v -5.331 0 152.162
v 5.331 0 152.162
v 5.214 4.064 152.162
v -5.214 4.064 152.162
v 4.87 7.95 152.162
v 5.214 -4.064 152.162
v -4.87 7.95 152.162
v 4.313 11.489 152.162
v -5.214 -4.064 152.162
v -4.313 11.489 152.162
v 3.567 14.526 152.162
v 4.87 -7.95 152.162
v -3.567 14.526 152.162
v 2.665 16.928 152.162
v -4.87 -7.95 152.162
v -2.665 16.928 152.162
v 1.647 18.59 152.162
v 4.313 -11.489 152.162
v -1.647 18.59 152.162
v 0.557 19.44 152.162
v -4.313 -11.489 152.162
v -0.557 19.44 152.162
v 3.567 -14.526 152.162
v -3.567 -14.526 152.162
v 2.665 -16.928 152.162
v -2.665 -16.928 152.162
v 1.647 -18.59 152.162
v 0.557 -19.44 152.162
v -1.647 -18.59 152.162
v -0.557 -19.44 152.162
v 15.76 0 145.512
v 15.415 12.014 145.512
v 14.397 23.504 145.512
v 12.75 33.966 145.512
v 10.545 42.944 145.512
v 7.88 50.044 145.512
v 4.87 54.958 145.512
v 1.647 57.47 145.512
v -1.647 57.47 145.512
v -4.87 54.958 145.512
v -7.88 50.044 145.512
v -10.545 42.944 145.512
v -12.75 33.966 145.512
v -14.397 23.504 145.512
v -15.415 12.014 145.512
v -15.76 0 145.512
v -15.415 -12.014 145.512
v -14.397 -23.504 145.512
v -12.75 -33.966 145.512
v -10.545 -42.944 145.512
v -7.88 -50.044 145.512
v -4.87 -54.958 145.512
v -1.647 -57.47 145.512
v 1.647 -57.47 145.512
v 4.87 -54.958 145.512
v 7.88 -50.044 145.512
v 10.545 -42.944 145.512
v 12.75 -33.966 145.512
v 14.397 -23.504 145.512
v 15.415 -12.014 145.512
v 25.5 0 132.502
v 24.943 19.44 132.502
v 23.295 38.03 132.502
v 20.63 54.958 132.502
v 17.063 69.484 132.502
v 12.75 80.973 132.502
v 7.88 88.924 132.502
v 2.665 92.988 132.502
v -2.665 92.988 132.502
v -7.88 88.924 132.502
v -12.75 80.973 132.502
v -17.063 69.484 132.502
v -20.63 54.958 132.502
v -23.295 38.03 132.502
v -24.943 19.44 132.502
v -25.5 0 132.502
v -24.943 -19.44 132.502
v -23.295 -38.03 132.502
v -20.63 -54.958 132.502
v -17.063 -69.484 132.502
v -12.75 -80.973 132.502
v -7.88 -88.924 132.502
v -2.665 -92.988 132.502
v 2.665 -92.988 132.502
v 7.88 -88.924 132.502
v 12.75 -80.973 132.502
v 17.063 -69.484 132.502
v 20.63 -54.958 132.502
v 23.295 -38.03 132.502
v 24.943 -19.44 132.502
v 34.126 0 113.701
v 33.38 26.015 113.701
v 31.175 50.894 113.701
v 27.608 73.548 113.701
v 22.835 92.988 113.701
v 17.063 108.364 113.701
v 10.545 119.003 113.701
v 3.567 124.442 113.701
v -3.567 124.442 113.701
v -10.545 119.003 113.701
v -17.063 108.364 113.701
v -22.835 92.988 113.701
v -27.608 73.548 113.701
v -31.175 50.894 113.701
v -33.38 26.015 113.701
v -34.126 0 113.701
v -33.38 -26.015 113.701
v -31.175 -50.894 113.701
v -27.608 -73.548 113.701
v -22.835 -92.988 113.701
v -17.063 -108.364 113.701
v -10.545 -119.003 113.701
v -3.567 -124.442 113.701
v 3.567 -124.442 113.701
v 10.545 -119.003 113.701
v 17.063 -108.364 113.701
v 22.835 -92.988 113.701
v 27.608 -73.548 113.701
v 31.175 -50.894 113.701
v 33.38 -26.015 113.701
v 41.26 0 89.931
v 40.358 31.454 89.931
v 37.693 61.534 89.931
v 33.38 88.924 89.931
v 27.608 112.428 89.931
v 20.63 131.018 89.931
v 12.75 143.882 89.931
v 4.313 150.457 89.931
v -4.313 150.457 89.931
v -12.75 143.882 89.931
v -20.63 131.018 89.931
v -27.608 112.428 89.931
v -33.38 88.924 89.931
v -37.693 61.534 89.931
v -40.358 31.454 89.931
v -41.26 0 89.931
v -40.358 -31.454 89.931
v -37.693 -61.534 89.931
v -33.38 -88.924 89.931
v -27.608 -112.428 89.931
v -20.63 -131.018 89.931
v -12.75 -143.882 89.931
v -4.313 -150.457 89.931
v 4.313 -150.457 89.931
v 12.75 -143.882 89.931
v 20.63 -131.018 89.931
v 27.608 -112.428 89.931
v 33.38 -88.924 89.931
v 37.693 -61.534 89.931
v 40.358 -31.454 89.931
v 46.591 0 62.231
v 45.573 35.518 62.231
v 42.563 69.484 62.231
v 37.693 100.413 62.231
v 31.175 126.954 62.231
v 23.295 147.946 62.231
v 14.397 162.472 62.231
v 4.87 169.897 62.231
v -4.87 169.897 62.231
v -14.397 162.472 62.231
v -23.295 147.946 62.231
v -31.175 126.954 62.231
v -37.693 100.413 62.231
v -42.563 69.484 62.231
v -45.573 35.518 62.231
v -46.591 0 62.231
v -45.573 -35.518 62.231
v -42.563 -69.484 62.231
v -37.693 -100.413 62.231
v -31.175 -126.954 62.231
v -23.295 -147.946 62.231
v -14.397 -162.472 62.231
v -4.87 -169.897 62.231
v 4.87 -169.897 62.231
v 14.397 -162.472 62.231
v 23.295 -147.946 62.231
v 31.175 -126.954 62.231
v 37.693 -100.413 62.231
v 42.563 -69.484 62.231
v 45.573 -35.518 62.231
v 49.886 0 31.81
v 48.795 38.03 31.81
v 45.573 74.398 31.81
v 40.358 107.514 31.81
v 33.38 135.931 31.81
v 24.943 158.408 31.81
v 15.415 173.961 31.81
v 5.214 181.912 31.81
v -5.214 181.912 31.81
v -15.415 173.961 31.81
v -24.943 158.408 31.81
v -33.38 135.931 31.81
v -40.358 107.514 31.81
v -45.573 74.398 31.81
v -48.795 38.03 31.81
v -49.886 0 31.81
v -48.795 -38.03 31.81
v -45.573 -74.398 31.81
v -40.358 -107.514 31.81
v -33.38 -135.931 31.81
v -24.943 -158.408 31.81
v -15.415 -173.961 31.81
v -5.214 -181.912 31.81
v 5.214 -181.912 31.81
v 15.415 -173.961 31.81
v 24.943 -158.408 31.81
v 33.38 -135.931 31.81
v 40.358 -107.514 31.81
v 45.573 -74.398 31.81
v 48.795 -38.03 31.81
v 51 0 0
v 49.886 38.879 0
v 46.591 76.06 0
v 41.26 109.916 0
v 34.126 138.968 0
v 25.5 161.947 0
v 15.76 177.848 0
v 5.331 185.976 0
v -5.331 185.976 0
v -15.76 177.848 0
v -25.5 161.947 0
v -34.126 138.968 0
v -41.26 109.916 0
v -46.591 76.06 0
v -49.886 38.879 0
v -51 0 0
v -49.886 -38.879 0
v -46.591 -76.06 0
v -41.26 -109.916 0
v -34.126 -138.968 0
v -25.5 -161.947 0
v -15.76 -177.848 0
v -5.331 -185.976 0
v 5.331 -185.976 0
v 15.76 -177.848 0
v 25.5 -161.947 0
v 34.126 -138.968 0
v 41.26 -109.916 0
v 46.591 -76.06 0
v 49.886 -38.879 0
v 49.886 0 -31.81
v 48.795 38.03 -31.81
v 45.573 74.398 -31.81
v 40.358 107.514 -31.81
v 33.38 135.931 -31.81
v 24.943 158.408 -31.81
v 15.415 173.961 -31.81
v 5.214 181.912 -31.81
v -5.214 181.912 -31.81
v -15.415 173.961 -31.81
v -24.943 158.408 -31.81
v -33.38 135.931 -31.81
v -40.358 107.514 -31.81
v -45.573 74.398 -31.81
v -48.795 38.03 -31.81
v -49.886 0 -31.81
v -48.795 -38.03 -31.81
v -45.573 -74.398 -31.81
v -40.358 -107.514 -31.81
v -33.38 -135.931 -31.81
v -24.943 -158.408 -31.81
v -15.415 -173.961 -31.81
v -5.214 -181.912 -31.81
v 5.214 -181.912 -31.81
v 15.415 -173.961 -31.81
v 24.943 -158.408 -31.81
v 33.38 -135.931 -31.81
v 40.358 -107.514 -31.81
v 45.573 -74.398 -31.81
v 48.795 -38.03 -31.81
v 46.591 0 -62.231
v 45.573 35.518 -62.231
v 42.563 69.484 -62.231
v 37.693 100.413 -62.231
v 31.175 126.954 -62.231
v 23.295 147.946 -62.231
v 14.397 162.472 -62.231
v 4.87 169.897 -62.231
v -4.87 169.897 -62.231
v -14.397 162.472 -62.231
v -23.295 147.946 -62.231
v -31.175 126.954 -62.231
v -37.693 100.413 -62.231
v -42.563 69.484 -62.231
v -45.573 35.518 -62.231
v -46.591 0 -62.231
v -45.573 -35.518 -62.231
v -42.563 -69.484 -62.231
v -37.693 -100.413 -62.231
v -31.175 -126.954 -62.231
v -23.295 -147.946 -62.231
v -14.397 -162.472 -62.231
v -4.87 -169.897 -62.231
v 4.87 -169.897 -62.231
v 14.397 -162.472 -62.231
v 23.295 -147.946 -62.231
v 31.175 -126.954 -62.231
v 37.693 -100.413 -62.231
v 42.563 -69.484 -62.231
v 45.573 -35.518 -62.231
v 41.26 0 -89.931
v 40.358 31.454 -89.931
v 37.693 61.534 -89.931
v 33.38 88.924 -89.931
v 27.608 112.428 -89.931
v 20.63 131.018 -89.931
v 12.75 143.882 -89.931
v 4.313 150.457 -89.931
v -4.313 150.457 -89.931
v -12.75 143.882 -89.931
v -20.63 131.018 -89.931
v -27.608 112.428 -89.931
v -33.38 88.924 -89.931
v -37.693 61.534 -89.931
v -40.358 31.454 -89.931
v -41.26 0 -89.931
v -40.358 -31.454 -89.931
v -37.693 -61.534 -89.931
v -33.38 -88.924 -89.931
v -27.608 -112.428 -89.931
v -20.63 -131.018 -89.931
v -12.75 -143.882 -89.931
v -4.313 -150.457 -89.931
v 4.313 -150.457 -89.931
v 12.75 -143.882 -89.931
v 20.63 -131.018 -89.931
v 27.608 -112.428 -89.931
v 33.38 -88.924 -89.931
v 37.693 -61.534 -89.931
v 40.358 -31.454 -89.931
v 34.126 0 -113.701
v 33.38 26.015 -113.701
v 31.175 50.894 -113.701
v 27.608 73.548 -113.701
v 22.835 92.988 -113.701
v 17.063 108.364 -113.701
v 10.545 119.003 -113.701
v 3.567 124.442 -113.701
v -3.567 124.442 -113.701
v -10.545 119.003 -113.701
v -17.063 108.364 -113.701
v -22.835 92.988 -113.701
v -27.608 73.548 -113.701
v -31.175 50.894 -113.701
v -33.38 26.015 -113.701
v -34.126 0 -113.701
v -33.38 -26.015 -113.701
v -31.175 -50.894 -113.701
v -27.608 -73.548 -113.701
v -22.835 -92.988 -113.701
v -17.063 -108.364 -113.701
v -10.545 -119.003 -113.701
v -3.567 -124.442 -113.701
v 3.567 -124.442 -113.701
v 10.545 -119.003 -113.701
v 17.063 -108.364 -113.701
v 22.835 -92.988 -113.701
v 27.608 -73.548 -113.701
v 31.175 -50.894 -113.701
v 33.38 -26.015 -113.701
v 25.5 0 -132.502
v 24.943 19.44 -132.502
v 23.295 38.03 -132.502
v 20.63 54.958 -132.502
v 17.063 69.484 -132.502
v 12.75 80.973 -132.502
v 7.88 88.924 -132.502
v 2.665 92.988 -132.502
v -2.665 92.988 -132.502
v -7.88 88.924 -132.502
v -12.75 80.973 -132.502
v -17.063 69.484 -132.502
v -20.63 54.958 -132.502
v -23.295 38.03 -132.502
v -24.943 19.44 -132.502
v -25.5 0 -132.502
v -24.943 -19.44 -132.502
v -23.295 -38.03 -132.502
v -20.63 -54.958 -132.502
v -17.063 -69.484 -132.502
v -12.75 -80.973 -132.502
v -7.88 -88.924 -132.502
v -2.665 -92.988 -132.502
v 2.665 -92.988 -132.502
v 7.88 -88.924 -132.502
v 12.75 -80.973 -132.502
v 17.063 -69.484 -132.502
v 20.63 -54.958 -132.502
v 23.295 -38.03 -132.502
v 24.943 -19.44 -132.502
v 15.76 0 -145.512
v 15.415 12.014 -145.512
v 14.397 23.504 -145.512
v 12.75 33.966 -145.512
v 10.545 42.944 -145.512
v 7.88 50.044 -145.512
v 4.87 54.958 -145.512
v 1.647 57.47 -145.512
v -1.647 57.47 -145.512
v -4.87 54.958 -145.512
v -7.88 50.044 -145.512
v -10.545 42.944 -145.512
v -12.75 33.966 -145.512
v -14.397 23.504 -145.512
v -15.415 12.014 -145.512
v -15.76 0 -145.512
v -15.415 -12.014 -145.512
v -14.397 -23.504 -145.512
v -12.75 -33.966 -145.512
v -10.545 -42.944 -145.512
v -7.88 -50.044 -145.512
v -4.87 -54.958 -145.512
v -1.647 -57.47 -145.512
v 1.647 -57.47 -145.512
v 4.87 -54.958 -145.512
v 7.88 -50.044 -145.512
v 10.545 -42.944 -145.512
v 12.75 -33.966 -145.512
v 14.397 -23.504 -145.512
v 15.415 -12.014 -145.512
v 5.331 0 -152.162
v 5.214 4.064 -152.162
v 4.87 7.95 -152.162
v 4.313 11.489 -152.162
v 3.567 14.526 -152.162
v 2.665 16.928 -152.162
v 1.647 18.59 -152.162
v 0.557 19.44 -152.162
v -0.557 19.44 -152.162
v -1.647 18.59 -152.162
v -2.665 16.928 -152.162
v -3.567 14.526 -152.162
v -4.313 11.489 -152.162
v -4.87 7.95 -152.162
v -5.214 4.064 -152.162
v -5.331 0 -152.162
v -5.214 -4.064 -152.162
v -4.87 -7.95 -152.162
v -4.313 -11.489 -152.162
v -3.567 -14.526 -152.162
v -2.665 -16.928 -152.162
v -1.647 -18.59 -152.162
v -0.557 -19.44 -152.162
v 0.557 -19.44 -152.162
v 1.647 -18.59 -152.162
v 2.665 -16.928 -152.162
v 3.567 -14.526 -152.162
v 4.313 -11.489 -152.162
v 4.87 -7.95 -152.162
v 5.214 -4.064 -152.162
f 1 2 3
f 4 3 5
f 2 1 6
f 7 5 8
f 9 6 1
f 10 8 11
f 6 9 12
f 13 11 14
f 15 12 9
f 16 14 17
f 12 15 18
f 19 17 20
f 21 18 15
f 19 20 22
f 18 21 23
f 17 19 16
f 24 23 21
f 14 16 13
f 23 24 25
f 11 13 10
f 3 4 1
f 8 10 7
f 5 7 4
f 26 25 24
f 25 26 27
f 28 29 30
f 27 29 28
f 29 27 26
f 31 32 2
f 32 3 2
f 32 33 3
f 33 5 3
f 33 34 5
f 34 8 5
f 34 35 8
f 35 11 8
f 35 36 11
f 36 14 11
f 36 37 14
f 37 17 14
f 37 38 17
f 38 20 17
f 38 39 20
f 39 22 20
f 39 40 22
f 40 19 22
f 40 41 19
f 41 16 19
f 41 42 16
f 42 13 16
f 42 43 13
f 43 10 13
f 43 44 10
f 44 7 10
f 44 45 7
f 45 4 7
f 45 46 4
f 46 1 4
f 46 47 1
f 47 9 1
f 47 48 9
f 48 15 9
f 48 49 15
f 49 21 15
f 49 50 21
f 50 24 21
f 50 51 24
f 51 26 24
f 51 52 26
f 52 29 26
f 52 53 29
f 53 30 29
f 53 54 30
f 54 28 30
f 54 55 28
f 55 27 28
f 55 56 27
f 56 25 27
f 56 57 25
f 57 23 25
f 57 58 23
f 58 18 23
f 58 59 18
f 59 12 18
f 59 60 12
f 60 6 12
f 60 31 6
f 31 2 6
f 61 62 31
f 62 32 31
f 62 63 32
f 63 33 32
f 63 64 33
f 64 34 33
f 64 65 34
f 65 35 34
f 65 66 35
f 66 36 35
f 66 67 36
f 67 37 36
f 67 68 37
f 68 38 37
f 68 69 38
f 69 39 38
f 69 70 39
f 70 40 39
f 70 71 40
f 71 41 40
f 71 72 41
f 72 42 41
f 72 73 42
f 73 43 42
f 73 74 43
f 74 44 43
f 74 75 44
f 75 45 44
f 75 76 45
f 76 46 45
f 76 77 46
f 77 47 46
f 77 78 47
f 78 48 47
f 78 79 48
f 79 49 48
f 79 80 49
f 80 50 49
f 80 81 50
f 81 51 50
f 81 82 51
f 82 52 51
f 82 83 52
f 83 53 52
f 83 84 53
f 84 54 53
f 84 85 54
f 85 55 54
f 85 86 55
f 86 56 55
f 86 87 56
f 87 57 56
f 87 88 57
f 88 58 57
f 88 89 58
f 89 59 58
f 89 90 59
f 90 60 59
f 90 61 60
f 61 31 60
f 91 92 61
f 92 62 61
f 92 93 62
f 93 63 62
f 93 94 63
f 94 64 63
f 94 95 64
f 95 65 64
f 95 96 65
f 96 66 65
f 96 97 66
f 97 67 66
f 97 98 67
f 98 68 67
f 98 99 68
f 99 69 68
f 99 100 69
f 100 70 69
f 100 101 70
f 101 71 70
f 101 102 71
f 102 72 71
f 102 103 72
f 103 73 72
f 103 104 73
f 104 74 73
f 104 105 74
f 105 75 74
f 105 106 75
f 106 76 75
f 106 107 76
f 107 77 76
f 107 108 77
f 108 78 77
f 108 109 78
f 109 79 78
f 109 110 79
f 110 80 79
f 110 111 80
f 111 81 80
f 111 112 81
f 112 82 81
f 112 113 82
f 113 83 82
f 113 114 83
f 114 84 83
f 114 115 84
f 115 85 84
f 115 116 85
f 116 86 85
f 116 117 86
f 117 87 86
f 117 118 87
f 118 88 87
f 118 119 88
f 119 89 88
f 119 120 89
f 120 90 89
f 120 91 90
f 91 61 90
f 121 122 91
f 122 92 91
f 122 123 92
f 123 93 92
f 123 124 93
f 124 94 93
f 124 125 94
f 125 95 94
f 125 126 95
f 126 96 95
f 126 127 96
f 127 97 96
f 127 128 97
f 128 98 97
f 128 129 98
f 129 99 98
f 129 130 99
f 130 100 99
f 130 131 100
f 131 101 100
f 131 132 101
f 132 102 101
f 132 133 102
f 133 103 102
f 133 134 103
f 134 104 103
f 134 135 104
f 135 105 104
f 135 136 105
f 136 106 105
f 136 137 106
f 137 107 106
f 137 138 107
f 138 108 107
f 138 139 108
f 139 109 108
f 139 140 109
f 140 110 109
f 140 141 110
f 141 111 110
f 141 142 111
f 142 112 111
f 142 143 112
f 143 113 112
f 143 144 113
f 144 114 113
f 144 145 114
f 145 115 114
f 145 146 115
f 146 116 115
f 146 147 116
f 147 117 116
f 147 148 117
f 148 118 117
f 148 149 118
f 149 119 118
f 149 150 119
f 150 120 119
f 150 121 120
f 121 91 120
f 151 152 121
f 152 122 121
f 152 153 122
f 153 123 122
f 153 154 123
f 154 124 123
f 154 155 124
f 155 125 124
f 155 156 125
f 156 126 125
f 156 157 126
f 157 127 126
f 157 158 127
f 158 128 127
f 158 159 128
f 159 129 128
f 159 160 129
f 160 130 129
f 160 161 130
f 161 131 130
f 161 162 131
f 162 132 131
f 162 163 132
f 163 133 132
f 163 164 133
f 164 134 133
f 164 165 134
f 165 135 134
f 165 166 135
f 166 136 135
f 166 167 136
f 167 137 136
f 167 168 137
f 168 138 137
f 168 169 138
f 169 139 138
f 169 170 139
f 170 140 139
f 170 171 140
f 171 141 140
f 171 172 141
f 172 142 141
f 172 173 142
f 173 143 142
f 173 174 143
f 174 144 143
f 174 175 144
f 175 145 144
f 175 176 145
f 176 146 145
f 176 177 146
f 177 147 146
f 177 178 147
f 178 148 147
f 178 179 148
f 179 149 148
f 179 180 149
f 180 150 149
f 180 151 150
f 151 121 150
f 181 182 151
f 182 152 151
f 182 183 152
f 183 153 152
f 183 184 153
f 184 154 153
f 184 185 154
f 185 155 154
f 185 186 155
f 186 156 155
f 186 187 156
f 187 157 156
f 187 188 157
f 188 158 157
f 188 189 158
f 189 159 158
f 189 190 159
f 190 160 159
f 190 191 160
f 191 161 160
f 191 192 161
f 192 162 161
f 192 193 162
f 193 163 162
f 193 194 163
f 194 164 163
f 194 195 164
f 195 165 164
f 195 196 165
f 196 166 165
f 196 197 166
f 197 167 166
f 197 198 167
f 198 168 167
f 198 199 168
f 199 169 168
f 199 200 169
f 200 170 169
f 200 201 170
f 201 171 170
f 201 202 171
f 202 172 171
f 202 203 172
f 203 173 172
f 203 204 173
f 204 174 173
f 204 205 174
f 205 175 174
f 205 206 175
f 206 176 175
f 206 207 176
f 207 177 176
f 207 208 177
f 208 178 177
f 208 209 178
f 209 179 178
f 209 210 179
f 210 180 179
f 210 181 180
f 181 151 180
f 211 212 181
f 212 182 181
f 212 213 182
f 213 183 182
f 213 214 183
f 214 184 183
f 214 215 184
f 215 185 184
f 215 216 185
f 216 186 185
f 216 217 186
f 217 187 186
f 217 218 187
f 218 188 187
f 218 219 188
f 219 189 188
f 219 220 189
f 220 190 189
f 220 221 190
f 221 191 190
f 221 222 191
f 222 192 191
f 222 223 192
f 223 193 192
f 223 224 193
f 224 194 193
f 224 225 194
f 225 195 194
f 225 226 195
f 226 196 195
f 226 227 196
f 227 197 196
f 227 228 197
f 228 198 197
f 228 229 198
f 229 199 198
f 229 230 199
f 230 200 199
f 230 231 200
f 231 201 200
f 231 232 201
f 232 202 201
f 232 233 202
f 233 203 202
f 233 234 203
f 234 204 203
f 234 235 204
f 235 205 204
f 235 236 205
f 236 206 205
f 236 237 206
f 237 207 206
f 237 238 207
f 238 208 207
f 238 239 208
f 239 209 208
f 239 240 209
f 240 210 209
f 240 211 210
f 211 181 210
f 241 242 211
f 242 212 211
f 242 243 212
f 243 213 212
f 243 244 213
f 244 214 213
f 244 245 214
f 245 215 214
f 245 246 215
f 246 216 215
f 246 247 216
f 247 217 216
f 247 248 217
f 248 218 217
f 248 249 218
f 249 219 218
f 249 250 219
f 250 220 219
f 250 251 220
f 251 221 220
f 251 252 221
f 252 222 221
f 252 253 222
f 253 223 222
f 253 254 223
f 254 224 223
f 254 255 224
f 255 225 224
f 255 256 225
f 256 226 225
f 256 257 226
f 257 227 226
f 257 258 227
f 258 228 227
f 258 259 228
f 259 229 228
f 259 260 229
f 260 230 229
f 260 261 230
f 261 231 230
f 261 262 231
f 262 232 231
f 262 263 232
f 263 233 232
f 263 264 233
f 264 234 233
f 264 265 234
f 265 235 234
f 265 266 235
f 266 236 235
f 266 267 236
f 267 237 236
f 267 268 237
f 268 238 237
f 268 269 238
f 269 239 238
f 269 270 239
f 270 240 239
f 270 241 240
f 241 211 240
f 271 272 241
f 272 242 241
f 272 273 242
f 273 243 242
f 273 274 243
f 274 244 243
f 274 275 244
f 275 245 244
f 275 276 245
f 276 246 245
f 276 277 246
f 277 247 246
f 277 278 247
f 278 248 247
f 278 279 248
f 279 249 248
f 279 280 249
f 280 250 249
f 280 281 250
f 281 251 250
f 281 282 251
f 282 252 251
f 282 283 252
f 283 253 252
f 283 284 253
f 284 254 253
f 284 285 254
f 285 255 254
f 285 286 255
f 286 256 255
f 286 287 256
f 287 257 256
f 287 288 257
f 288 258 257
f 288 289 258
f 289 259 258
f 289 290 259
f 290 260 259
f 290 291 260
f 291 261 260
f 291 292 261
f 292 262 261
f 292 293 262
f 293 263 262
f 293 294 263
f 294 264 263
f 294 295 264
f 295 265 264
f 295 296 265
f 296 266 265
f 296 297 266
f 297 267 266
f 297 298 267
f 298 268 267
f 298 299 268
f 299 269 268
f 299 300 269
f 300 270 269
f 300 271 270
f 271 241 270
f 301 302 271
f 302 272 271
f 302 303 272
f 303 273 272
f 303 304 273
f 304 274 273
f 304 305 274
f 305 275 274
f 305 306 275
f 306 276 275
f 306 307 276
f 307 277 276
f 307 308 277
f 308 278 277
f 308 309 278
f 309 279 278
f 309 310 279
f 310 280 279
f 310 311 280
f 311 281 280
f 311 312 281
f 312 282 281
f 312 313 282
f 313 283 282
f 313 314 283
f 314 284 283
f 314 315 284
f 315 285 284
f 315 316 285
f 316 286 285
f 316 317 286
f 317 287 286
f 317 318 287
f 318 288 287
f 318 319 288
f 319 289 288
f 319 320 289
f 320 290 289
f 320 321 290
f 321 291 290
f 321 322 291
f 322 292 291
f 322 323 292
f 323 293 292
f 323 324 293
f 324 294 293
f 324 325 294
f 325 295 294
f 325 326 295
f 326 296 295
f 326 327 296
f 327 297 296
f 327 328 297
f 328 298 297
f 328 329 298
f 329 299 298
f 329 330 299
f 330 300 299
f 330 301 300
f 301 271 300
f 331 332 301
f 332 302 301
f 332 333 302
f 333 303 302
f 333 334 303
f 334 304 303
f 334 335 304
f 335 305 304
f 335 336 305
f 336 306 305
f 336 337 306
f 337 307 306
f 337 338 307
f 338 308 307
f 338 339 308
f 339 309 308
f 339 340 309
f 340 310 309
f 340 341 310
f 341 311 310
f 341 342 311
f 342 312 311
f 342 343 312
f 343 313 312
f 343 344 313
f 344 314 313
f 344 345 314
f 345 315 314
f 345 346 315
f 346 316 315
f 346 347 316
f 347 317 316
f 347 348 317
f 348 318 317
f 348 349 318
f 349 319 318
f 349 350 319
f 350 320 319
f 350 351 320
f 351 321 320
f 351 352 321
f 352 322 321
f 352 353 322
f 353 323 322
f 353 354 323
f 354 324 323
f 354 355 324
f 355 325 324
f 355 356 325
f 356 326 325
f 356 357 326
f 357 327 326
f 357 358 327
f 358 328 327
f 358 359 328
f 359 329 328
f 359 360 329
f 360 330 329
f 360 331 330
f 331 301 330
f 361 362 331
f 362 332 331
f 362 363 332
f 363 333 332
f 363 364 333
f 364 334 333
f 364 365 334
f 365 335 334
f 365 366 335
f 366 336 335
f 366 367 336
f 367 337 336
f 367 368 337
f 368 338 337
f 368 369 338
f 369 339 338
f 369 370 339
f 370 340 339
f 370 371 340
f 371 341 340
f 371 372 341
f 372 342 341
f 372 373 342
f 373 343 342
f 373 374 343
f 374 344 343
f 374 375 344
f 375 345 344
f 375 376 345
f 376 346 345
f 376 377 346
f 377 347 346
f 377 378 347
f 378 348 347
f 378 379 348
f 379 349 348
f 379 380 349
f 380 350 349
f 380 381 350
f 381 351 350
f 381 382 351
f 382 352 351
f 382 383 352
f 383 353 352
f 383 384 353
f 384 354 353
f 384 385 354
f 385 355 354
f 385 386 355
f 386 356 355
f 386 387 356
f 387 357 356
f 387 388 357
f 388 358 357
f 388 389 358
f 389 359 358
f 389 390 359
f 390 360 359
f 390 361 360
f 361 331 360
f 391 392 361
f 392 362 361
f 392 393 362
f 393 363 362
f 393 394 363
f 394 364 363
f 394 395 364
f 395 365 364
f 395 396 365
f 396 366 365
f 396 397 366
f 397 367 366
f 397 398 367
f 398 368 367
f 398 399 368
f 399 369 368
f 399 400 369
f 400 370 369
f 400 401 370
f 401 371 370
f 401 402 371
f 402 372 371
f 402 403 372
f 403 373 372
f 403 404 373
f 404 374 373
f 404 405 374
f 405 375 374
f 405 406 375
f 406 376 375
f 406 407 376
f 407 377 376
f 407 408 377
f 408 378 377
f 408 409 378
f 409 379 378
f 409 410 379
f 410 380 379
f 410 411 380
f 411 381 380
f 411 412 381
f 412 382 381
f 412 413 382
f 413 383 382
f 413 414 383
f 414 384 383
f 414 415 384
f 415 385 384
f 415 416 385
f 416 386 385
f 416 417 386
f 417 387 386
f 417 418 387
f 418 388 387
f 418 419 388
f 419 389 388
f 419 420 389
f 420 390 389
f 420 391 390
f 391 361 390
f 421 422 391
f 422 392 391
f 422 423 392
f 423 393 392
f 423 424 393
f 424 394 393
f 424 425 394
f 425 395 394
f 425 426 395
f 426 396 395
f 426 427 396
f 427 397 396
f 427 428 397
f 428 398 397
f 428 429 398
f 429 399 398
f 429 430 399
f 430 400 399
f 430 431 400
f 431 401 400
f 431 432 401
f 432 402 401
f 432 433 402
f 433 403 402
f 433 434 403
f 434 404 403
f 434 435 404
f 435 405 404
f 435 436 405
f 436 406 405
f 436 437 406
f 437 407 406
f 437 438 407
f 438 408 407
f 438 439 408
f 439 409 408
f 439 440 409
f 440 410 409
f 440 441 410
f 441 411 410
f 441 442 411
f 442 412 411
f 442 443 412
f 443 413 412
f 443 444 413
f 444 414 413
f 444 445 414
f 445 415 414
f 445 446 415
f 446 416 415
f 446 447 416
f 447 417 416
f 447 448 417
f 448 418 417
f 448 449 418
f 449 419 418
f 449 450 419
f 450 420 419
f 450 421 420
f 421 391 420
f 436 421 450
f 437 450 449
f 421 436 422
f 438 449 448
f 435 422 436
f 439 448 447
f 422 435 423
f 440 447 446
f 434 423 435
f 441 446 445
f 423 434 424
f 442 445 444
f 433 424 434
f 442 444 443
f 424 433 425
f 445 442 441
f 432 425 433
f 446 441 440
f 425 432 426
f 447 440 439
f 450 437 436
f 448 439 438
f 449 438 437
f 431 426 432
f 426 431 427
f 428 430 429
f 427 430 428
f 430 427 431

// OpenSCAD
// Generated by SolidPython 1.0.1 on 2020-07-29 00:46:45


scale(v = [3, 11, 9]) {
	sphere(r = 17);
}
/***********************************************
*********      SolidPython code:      **********
************************************************
 
# import packages: SolidPython
from solid import *
from solid.utils import *
from itertools import chain, combinations, permutations


class Resize:

    def __init__(self, scad_file):
        self.scad_file = scad_file
        #self.scad_file = import_scad(scad_file)
        # cone/cylinder param:
        self.r1 = 0
        self.r2 = 0
        self.h = 0
        # rectangular prism param:
        self.w = 0
        self.l = 0
        # ellipse param:
        self.r = 0

    # import OpenScad code (file name corresponds to shape)


    # classify shape + parameters
    def assign(self, param1, param2, param3):
        if self.scad_file == 'cone.scad':
            self.r1 = param1
            self.r2 = param2
            self.h = param3
        elif self.scad_file == 'cylinder.scad':
            self.r1 = param1
            self.r2 = param2
            self.h = param3
        elif self.scad_file == 'rectangularPrism.scad':
            self.h = param1
            self.l = param2
            self.w = param3
        else:
            self.r = param1
            self.h = param2

    # resize parameters
    def iterate(self):
        x = range(3, 20, 2)
        i = 1
        if self.scad_file == 'cone.scad':
            tempList = list(permutations(x, 2))
            for temp in tempList:
                param1 = temp[0]
                param2 = temp[1]
                filepath = 'produced_scad_files/' + 'cone' + str(param1) + '_' + str(param2) + '_' + '.scad'
                scad_render_to_file(cylinder(h=param1, r1=param2, r2=0), filepath)

        elif self.scad_file == 'cylinder.scad':
            tempList = list(permutations(x, 3))
            for temp in tempList:
                param1 = temp[0]
                param2 = temp[1]
                filepath = 'produced_scad_files/' + 'cylinder' + str(param1) + '_' + str(param2) + '_' + '.scad'
                scad_render_to_file(cylinder(h=param1, r1=param2, r2=param2), filepath)

        elif self.scad_file == 'rectangularPrism.scad':
            tempList = list(permutations(x, 3))
            for temp in tempList:
                param1 = temp[0]
                param2 = temp[1]
                param3 = temp[2]
                filepath = 'produced_scad_files/' + 'rectangularPrism' + str(param1) + '_' + str(param2) + '_' + str(
                    param3) + '.scad'
                scad_render_to_file(cube(size=(param1, param2, param3)), filepath)

        elif self.scad_file == 'ellipse.scad':
            tempList = list(permutations(x, 4))
            for temp in tempList:
                param1 = temp[0]
                param2 = temp[1]
                param3 = temp[2]
                param4 = temp[3]
                filepath = 'produced_scad_files/' + 'ellipse' + str(param1) + '_' + str(param2) + '_' + str(param3) + '_' + str(param4) + '.scad'
                scad_render_to_file(scale([param1, param2, param3])(sphere(r=param4)), filepath)

    def render_to_scadfile(self):
        scad_render_to_file(scad, 'example.scad') 
 
************************************************/
